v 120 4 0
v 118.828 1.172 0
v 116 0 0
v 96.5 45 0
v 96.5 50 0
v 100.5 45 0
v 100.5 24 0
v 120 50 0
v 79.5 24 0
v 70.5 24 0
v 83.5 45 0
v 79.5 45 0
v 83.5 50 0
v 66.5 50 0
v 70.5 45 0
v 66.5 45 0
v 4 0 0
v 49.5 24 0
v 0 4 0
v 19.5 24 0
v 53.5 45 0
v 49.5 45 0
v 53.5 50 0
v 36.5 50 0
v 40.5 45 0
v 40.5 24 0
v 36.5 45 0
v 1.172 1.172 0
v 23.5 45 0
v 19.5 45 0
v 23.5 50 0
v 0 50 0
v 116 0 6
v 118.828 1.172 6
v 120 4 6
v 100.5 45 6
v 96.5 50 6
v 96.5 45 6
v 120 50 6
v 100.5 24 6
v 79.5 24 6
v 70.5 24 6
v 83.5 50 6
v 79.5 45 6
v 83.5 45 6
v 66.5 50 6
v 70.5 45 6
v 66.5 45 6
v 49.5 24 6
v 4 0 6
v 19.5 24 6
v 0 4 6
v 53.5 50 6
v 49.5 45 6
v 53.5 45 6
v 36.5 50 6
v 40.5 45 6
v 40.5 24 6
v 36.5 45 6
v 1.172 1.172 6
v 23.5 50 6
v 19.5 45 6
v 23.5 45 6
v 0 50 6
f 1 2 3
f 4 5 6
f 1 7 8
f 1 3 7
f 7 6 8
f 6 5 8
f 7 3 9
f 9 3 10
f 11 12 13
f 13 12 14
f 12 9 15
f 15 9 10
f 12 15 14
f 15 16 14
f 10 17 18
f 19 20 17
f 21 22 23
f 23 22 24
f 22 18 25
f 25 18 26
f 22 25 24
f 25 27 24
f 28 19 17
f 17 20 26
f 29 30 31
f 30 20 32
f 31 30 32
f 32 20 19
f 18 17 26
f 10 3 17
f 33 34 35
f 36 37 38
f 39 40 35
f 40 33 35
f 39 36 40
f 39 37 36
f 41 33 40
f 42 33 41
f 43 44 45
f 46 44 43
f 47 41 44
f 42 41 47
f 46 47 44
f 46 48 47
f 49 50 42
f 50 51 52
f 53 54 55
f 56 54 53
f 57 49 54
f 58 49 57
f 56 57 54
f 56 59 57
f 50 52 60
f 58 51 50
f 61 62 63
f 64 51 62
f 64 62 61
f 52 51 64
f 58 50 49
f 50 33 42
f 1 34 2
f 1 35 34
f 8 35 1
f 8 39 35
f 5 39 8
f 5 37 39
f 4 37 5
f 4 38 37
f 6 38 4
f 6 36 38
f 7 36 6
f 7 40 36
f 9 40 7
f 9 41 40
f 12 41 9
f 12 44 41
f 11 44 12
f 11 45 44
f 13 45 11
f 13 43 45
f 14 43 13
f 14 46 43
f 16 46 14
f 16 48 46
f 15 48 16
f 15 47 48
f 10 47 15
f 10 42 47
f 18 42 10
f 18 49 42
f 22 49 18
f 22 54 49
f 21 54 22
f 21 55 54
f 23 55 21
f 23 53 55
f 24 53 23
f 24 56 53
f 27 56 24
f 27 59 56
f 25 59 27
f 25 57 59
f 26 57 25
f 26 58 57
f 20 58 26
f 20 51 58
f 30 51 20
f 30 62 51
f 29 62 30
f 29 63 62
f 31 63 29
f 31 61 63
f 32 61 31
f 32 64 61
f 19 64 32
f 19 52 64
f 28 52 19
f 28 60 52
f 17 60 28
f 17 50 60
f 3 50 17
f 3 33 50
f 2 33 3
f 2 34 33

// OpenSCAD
$fn = 32;

// ----------------------------------------------------------------------
// Oversize slot bar: 120 mm bar with 3 oversize windows
// ----------------------------------------------------------------------

// --- parameters (mm) ---
profile_height = 6;       // extrusion height
profile_points = 32;      // points of the closed outline

profile = [[0, 4], [1.172, 1.172], [4, 0], [116, 0], [118.828, 1.172], [120, 4], [120, 50], [96.5, 50], [96.5, 45], [100.5, 45], [100.5, 24], [79.5, 24], [79.5, 45], [83.5, 45], [83.5, 50], [66.5, 50], [66.5, 45], [70.5, 45], [70.5, 24], [49.5, 24], [49.5, 45], [53.5, 45], [53.5, 50], [36.5, 50], [36.5, 45], [40.5, 45], [40.5, 24], [19.5, 24], [19.5, 45], [23.5, 45], [23.5, 50], [0, 50]];  // single closed polygon, 32 points, counter clockwise

// --- the one profile operation ---
linear_extrude(height = profile_height) polygon(points = profile);
